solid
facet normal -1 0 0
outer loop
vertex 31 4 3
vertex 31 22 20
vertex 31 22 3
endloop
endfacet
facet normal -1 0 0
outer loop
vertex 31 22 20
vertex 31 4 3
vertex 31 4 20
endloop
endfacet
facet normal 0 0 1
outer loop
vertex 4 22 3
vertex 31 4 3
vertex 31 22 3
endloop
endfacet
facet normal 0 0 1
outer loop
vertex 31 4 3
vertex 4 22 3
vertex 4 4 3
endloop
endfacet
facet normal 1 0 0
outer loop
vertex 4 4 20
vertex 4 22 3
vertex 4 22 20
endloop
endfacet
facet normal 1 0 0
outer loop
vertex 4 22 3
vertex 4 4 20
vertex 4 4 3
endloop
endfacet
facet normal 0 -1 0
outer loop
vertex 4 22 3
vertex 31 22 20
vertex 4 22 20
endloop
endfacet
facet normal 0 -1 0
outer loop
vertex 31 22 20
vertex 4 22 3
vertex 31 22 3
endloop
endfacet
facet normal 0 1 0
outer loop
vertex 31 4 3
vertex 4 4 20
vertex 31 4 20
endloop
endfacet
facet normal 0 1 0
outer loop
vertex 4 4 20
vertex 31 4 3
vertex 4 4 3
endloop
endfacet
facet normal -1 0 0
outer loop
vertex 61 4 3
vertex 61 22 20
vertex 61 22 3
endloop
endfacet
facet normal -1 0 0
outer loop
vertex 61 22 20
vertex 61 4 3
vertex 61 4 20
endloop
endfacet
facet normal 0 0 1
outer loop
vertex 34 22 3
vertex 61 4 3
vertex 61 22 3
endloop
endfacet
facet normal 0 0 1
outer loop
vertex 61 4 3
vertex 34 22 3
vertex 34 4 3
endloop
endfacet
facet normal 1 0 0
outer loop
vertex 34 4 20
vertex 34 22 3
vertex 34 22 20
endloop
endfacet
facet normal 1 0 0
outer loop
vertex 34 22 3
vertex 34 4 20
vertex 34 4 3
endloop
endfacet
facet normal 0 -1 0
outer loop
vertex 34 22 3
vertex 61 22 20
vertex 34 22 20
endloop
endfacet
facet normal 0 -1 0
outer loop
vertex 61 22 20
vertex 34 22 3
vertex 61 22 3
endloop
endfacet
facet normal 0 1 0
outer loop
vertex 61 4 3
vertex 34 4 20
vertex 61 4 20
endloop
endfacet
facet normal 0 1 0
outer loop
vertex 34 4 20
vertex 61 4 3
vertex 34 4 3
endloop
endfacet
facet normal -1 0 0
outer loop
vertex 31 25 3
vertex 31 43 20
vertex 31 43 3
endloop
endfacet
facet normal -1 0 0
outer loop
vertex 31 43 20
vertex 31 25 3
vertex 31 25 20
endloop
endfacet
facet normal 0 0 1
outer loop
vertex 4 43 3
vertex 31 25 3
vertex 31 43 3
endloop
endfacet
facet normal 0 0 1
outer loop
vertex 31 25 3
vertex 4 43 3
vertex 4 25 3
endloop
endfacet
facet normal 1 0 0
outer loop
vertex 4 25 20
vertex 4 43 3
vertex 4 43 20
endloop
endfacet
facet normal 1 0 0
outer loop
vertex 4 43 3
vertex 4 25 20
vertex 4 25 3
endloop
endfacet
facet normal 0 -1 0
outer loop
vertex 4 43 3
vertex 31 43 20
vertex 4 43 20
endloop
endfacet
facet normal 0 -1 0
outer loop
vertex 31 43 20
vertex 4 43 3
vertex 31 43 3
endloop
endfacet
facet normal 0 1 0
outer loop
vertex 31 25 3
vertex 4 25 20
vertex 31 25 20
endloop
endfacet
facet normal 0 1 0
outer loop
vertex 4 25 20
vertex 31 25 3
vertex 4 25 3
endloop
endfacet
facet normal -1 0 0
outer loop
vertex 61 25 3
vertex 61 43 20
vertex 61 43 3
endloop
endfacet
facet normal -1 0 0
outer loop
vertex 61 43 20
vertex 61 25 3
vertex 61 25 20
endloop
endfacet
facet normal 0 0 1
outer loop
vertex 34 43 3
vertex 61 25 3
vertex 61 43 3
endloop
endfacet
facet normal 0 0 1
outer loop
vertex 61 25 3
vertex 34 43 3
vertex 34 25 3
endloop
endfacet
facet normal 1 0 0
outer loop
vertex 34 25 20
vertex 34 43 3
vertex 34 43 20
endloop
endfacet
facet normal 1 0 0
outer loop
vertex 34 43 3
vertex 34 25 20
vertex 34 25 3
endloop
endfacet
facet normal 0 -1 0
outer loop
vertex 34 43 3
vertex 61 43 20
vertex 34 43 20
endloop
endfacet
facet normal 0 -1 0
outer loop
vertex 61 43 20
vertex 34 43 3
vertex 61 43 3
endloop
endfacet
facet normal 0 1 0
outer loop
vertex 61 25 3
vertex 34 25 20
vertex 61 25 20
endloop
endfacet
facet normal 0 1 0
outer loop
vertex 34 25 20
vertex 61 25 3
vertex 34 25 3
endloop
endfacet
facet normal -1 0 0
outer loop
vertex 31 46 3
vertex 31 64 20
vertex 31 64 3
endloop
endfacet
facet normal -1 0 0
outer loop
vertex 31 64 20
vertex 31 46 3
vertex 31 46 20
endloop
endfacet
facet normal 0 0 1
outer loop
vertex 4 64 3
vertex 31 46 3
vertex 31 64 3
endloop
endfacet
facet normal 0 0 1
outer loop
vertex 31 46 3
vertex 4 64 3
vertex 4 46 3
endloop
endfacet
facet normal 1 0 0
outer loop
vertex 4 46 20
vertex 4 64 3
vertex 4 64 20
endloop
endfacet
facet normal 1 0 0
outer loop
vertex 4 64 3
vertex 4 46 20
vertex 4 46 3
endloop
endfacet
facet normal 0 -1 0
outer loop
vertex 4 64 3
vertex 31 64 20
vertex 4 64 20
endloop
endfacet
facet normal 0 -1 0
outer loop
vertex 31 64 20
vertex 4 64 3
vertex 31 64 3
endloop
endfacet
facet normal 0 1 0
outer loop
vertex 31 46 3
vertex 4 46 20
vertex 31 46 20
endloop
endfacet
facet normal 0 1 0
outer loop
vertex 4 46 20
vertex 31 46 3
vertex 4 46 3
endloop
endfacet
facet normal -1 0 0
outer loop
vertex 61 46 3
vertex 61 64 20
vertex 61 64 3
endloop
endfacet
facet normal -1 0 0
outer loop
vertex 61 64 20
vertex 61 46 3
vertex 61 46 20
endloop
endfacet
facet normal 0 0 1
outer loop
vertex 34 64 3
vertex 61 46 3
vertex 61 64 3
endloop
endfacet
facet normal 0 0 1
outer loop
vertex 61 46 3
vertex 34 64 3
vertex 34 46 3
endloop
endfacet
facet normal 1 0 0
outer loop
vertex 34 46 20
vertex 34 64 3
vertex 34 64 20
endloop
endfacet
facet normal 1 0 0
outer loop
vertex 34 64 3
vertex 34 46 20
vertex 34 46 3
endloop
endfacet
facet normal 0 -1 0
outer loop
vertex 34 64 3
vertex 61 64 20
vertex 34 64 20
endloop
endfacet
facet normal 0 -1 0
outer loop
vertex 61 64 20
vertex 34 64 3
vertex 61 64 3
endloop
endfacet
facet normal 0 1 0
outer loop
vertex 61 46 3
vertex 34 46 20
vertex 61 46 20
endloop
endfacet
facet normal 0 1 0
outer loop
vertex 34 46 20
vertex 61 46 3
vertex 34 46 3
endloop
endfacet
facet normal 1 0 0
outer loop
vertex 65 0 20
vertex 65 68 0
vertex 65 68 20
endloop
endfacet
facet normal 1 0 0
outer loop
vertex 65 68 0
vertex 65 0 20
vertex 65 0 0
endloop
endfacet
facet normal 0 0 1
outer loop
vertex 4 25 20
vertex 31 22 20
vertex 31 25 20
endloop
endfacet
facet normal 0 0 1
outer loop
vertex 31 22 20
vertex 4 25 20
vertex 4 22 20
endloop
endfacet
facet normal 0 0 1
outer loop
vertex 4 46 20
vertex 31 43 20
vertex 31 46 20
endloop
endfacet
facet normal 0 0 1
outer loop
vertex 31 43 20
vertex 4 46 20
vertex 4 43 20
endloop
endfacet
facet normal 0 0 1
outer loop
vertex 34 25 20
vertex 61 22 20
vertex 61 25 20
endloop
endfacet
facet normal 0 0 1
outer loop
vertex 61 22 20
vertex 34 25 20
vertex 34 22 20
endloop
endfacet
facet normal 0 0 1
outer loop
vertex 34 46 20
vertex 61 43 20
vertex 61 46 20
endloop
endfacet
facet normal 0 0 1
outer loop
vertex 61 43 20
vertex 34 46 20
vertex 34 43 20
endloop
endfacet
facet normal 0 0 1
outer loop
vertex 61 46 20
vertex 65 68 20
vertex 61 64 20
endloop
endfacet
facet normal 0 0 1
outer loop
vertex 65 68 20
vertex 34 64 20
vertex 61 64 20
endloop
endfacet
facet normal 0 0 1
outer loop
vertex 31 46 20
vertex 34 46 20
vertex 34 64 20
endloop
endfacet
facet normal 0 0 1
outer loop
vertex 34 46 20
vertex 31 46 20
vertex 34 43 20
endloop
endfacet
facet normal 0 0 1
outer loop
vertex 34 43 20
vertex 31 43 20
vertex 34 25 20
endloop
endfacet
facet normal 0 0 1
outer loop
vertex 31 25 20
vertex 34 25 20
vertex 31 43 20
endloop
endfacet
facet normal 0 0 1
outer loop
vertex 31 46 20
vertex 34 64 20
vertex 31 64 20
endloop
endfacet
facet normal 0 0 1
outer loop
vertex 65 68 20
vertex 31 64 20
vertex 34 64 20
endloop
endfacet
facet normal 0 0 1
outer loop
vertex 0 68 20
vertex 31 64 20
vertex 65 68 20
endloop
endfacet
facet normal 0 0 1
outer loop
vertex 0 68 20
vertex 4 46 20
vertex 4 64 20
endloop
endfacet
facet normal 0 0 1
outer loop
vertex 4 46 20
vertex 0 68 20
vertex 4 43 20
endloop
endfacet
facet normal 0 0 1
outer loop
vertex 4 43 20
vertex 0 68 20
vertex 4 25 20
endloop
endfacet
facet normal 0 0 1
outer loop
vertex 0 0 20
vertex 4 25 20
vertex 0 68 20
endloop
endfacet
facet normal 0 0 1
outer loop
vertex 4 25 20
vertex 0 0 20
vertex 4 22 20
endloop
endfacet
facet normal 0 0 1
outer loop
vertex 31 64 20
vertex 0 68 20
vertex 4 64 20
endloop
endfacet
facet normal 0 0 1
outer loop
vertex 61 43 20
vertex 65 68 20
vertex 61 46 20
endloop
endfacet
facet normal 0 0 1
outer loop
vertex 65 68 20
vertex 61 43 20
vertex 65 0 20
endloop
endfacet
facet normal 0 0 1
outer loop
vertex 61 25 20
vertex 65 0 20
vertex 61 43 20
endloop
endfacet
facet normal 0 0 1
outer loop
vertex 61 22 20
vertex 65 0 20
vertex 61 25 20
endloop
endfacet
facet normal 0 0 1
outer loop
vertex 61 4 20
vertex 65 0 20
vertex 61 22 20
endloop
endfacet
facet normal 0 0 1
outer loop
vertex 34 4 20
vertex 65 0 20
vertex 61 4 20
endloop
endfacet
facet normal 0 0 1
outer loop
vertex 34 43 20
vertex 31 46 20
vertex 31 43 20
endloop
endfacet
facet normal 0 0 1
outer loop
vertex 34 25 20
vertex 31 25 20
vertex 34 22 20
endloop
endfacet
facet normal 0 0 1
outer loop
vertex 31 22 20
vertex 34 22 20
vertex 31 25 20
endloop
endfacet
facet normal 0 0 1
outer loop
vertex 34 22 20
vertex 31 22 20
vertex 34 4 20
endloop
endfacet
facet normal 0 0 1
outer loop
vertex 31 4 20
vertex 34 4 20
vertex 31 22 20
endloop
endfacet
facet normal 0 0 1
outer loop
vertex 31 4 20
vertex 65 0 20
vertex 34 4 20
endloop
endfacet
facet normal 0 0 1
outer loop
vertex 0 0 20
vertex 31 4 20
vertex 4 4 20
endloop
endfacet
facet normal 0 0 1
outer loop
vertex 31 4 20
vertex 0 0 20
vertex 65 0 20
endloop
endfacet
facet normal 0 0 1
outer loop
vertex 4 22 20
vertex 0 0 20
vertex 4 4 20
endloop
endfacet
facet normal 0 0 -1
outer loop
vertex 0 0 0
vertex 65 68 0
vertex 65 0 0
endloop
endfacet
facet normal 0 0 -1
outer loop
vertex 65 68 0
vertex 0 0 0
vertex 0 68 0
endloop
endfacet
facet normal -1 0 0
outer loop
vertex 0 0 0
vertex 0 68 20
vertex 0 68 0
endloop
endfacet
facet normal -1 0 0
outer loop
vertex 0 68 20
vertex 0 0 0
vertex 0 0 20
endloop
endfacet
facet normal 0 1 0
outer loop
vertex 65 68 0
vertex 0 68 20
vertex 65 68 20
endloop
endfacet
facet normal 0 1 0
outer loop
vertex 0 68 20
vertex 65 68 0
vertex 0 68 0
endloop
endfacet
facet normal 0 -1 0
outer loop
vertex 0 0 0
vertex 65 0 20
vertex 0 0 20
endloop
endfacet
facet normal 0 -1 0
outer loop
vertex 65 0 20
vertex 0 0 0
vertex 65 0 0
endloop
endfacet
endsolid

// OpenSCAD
// [FL_INDEX: keywords="openscad, 3d_parametric, 9_Volt_Battery_Tray, csg_solid" | COT="Parametric OpenSCAD design from 3DCodeverse"]
// Title: 9 Volt Battery Tray

// 9 Volt Battery Tray

InnerWallThickness = 3;
OuterWallThickness = 4;
BottomThickness = 3;
TrayHeight = 20; // Overall height, includes BottomThickness

BatteryWidth = 26.5;
BatteryDepth = 17.5;
BatteryHeight = 48.5;
BatteryMargin = .5;

Rows    = 3; // in the BatteryDepth direction
Columns = 2; // In the BatteryWidth direction

module batteryHole() {
	cube(size=[BatteryWidth+BatteryMargin,
	           BatteryDepth+BatteryMargin,
	           BatteryHeight+BatteryMargin]);
}

module Base() {
	cube(size=[(BatteryWidth+BatteryMargin)*Columns + OuterWallThickness*2 + InnerWallThickness*(Columns-1),
               (BatteryDepth+BatteryMargin)*Rows    + OuterWallThickness*2 + InnerWallThickness*(Rows   -1),
	           TrayHeight]);
}

module BatteryTray() {
	// Subtract the batteries
	difference() {
		Base();
		for (row = [0:Rows-1])
			for (col = [0:Columns-1])
				translate(v=[OuterWallThickness + (BatteryWidth+BatteryMargin+InnerWallThickness)*col,
				             OuterWallThickness + (BatteryDepth+BatteryMargin+InnerWallThickness)*row,
				             BottomThickness])
					batteryHole();
	}
}

BatteryTray();
